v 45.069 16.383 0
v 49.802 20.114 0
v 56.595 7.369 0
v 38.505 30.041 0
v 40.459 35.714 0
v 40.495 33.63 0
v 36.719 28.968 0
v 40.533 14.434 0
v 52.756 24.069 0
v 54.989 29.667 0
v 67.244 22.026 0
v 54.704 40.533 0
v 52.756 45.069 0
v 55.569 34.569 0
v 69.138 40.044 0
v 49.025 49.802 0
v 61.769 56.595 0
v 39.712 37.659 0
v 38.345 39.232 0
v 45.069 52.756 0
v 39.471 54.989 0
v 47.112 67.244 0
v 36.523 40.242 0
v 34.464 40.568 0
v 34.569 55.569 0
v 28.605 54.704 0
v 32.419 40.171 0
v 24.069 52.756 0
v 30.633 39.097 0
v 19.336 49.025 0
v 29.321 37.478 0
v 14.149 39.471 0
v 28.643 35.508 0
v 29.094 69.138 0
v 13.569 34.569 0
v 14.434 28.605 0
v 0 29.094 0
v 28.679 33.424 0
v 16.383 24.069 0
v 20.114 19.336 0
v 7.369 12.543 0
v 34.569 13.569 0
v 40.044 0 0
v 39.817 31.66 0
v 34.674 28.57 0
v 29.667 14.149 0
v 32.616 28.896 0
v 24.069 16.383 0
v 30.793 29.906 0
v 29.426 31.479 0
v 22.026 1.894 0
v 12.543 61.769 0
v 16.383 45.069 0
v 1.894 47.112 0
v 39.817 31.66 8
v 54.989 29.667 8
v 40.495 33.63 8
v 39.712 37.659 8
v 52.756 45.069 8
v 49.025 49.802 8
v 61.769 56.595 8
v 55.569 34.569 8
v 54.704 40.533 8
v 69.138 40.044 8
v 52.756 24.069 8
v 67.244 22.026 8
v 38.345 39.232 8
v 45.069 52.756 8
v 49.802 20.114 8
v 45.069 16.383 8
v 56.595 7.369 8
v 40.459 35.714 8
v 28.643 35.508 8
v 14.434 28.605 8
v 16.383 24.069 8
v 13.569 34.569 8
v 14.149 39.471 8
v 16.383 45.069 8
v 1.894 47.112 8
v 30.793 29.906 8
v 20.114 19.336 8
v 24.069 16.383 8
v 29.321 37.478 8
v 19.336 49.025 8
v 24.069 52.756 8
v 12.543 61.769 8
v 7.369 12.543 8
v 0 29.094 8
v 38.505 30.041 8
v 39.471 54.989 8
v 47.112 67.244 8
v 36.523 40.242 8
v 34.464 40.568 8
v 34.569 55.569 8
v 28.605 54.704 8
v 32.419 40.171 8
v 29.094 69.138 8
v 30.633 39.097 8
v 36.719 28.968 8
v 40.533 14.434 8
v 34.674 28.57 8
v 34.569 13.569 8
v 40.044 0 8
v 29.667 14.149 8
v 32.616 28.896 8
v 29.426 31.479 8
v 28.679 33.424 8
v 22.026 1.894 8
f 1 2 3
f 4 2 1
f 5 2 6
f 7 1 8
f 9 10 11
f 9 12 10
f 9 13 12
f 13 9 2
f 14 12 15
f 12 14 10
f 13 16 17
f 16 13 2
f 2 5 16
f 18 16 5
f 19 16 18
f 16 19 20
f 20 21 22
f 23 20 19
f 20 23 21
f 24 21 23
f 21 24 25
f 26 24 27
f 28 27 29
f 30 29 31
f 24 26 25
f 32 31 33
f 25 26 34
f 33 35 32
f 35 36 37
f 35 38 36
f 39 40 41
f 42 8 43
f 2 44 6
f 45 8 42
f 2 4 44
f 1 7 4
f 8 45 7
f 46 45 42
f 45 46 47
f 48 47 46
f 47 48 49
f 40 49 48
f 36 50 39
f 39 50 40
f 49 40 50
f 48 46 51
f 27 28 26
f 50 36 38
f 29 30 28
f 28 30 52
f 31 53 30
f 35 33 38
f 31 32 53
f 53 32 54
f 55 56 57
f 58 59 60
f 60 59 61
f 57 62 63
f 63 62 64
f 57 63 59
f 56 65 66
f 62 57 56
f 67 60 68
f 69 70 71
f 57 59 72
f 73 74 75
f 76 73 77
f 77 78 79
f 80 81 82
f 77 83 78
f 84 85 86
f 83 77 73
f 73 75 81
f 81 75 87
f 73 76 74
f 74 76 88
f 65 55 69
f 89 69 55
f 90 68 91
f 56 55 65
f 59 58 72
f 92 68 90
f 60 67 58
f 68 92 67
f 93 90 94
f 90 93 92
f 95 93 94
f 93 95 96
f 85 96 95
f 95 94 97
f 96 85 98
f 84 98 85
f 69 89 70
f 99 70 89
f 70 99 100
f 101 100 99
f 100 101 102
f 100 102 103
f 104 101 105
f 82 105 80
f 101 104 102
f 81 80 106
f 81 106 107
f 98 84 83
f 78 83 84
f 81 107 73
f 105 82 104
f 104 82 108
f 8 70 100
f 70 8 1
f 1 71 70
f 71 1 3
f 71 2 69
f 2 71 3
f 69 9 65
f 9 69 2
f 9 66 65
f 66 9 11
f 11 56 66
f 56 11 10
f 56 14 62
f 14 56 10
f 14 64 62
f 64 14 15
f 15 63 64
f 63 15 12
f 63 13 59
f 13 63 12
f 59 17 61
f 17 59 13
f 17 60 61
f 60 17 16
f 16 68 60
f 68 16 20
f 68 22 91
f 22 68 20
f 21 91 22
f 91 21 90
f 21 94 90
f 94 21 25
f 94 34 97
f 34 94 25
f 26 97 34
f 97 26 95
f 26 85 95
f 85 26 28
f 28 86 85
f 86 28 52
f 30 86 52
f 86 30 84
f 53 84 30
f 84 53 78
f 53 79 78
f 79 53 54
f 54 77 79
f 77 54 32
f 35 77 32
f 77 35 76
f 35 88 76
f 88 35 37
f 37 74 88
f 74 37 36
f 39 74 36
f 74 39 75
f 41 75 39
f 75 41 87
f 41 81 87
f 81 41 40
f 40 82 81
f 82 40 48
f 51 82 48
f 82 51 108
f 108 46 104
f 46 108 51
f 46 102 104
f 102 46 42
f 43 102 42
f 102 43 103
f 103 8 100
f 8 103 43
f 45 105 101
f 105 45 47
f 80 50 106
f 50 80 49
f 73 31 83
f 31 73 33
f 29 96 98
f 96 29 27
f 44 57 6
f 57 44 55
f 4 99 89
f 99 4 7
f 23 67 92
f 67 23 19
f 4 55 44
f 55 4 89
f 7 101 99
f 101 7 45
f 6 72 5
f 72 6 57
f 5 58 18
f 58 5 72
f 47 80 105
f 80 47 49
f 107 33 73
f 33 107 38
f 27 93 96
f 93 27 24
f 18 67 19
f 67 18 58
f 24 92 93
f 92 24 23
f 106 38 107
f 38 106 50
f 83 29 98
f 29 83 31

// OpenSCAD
$fn = 32;

// ----------------------------------------------------------------------
// Star wheel: 12-point ratchet, R35
// ----------------------------------------------------------------------

// --- parameters (mm) ---
n_points = 12;            // number of points / teeth
r_out = 35;               // tip radius
r_in = 21;                // root radius
bore_r = 6;               // centre bore radius
plate_t = 8;              // plate thickness, Z (extrusion height)
bore_d = 12;              // centre bore diameter

profile = [[55.569, 34.569], [69.138, 40.044], [54.704, 40.533], [52.756, 45.069], [61.769, 56.595], [49.025, 49.802], [45.069, 52.756], [47.112, 67.244], [39.471, 54.989], [34.569, 55.569], [29.094, 69.138], [28.605, 54.704], [24.069, 52.756], [12.543, 61.769], [19.336, 49.025], [16.383, 45.069], [1.894, 47.112], [14.149, 39.471], [13.569, 34.569], [0, 29.094], [14.434, 28.605], [16.383, 24.069], [7.369, 12.543], [20.114, 19.336], [24.069, 16.383], [22.026, 1.894], [29.667, 14.149], [34.569, 13.569], [40.044, 0], [40.533, 14.434], [45.069, 16.383], [56.595, 7.369], [49.802, 20.114], [52.756, 24.069], [67.244, 22.026], [54.989, 29.667]];  // primary outline, 36 points, counter clockwise
void_1 = [[40.459, 35.714], [39.712, 37.659], [38.345, 39.232], [36.523, 40.242], [34.464, 40.568], [32.419, 40.171], [30.633, 39.097], [29.321, 37.478], [28.643, 35.508], [28.679, 33.424], [29.426, 31.479], [30.793, 29.906], [32.616, 28.896], [34.674, 28.57], [36.719, 28.968], [38.505, 30.041], [39.817, 31.66], [40.495, 33.63]];  // centre bore, 18 points

// --- the one profile operation ---
difference() {
  linear_extrude(height = plate_t) polygon(points = profile);
  translate([0, 0, -1])
    linear_extrude(height = plate_t + 2) polygon(points = void_1);
}
